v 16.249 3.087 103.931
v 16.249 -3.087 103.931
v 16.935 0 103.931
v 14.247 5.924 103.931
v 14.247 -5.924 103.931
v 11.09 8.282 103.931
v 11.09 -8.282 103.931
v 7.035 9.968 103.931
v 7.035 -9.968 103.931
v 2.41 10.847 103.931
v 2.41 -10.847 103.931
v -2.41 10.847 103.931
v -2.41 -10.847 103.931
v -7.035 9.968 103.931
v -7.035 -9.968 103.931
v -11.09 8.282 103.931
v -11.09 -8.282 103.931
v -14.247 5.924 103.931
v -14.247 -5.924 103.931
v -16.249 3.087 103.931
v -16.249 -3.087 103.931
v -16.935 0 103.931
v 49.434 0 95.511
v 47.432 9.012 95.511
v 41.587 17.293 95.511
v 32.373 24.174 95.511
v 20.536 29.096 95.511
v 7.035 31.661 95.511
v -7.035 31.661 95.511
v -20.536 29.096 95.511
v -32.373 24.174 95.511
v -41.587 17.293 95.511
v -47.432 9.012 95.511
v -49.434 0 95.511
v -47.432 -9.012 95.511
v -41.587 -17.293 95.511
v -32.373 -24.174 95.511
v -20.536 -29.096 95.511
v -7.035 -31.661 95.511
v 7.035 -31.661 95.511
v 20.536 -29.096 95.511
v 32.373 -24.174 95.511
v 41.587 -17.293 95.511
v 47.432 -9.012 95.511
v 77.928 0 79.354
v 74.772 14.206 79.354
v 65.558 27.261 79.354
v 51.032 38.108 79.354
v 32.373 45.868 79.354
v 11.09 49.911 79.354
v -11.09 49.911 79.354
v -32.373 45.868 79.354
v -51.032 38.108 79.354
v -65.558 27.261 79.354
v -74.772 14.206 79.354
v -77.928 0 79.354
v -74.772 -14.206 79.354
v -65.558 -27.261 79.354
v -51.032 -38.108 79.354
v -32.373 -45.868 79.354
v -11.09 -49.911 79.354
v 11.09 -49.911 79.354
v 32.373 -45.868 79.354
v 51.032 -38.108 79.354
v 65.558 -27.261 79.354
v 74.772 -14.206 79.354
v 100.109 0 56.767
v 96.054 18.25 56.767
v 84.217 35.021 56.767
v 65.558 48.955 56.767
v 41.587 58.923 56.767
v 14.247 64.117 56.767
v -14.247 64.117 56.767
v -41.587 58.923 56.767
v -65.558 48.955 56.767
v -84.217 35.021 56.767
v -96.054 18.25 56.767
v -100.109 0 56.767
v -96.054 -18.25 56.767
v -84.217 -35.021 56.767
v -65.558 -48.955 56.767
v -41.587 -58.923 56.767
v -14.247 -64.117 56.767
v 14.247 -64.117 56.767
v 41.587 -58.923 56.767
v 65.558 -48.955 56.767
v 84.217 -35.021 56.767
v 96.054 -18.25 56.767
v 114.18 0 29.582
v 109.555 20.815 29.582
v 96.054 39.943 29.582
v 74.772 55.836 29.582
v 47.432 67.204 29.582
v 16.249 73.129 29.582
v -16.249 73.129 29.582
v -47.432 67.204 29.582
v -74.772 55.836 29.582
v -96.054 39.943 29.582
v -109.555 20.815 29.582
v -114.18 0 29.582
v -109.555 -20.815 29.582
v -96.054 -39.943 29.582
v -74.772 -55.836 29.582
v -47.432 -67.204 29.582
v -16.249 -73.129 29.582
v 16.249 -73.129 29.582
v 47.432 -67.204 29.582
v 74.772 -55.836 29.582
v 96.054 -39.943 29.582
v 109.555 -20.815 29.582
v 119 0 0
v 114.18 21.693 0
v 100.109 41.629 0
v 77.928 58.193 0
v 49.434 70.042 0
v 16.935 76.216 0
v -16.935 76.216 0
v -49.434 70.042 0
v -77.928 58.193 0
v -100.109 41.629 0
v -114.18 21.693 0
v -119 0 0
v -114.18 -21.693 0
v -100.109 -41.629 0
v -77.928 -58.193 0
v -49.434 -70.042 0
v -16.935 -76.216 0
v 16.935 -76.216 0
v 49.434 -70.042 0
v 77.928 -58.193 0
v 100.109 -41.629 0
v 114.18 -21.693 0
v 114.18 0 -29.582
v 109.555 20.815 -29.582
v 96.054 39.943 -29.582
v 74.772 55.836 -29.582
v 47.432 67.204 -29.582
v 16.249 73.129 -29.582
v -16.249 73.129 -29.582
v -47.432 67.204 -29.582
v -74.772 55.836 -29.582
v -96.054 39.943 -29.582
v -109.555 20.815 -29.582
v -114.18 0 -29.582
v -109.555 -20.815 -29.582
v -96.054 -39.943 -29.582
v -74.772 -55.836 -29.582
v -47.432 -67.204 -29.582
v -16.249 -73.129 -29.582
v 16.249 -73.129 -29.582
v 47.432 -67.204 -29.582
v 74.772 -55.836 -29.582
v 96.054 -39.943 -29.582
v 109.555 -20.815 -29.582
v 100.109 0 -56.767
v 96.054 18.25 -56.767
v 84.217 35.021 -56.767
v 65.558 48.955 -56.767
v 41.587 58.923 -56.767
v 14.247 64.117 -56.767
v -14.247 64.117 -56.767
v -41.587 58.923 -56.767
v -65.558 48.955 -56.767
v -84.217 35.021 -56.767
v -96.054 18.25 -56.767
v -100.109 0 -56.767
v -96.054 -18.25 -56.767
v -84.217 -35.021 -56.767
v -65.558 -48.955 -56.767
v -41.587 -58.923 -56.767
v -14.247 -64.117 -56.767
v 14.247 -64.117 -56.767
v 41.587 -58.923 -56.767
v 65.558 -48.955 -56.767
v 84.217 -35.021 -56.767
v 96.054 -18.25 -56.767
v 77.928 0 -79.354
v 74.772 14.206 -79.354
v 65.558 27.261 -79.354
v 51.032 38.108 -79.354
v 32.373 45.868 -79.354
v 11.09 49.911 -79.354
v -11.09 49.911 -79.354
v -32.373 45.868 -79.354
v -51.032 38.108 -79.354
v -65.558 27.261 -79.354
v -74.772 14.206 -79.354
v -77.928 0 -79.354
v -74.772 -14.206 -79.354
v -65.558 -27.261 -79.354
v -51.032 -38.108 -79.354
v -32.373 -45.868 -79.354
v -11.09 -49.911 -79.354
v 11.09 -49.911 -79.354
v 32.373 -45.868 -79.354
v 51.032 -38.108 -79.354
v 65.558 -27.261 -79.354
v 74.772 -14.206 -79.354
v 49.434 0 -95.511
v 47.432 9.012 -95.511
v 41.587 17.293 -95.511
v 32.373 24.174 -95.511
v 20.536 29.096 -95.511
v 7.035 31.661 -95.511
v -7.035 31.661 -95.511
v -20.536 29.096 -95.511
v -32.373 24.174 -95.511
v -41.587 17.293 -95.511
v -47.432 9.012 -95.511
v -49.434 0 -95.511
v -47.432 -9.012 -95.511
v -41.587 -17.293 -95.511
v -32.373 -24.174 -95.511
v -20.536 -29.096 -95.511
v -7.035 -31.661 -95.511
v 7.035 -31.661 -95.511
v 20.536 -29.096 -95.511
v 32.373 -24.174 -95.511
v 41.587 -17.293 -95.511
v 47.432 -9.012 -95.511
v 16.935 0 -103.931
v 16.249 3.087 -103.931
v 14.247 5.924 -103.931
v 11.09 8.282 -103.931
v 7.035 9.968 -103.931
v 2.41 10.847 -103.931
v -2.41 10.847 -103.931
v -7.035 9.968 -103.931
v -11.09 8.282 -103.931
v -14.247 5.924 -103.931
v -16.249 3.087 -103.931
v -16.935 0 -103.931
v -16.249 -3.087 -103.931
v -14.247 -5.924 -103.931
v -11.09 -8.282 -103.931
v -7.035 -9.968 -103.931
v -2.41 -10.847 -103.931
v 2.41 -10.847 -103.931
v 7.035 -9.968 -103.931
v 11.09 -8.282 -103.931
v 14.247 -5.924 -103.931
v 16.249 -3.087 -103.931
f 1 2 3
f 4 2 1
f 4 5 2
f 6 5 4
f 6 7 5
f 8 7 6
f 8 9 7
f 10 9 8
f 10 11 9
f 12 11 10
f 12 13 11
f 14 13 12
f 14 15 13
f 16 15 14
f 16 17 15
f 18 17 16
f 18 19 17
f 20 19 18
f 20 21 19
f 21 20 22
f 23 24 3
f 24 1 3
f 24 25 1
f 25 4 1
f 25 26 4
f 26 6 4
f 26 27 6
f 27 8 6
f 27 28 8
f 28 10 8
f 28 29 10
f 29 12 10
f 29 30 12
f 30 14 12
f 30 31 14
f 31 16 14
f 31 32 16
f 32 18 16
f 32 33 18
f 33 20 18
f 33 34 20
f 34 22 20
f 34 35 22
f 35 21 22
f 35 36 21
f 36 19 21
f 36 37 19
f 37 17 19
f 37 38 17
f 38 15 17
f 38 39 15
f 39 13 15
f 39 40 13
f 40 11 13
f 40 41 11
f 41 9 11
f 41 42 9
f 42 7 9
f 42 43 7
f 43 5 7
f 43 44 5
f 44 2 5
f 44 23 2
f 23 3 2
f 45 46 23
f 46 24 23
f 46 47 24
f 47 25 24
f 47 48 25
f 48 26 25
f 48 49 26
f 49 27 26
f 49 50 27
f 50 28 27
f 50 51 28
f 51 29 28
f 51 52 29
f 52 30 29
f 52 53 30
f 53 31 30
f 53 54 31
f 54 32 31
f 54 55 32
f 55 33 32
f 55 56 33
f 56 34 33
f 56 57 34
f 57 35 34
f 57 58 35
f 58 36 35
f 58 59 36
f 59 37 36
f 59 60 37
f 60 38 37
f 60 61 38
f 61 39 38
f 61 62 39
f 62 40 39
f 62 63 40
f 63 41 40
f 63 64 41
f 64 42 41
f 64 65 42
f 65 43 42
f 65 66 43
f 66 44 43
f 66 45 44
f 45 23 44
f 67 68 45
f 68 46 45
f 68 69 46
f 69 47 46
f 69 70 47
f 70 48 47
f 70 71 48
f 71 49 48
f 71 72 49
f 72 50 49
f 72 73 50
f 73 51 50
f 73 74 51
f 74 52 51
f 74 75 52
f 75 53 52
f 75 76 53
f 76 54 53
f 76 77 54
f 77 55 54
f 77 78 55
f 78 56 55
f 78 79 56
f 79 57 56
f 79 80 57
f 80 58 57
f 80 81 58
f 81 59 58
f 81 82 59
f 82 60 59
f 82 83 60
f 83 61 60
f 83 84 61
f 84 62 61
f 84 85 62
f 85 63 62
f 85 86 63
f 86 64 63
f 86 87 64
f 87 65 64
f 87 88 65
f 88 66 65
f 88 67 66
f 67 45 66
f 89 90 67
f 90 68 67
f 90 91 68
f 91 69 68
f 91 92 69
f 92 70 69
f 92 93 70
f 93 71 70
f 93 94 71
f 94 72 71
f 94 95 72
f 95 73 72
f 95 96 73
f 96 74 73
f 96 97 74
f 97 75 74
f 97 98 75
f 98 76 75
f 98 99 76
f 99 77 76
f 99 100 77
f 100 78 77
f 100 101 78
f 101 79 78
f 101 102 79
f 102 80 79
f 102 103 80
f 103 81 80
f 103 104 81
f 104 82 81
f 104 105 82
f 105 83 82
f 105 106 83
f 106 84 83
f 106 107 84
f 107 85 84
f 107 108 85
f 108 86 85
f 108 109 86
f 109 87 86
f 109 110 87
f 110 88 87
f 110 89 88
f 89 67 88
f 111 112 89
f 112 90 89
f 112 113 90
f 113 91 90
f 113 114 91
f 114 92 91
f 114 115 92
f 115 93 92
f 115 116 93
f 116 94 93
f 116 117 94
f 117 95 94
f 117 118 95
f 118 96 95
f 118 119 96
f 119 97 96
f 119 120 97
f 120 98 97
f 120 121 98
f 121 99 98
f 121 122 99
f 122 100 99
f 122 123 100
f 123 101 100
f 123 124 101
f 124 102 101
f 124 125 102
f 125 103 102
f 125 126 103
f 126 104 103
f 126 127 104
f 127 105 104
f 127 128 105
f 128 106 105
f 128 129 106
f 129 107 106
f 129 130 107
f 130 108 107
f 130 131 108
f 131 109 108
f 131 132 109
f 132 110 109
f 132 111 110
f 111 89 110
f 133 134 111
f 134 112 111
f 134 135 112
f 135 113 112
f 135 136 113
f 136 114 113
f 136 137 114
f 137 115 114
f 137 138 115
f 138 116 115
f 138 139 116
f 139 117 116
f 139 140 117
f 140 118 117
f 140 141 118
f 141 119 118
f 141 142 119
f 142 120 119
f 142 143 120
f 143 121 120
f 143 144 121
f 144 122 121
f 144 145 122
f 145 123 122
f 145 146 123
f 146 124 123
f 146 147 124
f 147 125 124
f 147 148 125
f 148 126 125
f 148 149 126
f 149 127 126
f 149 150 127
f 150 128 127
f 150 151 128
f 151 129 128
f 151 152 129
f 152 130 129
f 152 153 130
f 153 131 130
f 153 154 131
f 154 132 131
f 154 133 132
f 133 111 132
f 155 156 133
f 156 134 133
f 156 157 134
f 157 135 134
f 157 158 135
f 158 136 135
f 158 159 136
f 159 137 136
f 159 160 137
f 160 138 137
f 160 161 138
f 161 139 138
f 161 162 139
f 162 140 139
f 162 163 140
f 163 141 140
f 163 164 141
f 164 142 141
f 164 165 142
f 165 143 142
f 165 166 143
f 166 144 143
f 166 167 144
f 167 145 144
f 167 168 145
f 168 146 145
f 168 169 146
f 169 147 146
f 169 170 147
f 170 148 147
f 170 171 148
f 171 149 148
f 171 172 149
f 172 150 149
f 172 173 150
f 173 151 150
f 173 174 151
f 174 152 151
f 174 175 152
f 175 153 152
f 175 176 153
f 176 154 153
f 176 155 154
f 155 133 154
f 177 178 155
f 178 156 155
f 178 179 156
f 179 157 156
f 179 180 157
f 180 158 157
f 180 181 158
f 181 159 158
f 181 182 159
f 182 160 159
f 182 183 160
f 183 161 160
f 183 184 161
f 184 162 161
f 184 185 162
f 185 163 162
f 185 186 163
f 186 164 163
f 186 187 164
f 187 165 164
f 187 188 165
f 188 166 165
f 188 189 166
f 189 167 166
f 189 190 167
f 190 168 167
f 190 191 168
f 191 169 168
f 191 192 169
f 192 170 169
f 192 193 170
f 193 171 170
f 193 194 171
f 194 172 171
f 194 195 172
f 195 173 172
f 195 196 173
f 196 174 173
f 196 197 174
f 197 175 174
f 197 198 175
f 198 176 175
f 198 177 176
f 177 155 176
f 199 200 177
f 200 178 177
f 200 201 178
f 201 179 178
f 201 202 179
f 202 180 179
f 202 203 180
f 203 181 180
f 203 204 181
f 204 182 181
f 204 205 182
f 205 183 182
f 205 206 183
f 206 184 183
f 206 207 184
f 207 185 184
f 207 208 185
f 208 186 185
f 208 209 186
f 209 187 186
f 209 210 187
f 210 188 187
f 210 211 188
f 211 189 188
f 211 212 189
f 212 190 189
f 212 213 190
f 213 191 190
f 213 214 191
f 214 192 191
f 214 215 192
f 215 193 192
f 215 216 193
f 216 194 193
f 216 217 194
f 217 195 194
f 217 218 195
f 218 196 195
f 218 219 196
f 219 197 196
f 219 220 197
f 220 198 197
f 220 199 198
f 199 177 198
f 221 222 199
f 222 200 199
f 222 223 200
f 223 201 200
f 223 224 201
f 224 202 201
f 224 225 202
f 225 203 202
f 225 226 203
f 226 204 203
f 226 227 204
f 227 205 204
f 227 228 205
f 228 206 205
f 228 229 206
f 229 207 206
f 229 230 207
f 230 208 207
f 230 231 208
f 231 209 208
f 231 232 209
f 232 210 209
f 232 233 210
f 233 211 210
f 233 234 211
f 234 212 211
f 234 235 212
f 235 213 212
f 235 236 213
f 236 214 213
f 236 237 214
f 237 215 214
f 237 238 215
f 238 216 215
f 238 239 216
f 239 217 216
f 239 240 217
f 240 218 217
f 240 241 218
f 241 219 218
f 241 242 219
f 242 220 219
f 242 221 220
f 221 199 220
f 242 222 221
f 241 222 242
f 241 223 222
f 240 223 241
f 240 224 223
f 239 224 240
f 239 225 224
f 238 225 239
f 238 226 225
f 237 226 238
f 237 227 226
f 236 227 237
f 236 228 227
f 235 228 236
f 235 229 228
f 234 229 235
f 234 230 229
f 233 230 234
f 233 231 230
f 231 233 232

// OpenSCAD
// Generated by SolidPython 1.0.1 on 2020-07-29 00:46:53


scale(v = [17, 11, 15]) {
	sphere(r = 7);
}
/***********************************************
*********      SolidPython code:      **********
************************************************
 
# import packages: SolidPython
from solid import *
from solid.utils import *
from itertools import chain, combinations, permutations


class Resize:

    def __init__(self, scad_file):
        self.scad_file = scad_file
        #self.scad_file = import_scad(scad_file)
        # cone/cylinder param:
        self.r1 = 0
        self.r2 = 0
        self.h = 0
        # rectangular prism param:
        self.w = 0
        self.l = 0
        # ellipse param:
        self.r = 0

    # import OpenScad code (file name corresponds to shape)


    # classify shape + parameters
    def assign(self, param1, param2, param3):
        if self.scad_file == 'cone.scad':
            self.r1 = param1
            self.r2 = param2
            self.h = param3
        elif self.scad_file == 'cylinder.scad':
            self.r1 = param1
            self.r2 = param2
            self.h = param3
        elif self.scad_file == 'rectangularPrism.scad':
            self.h = param1
            self.l = param2
            self.w = param3
        else:
            self.r = param1
            self.h = param2

    # resize parameters
    def iterate(self):
        x = range(3, 20, 2)
        i = 1
        if self.scad_file == 'cone.scad':
            tempList = list(permutations(x, 2))
            for temp in tempList:
                param1 = temp[0]
                param2 = temp[1]
                filepath = 'produced_scad_files/' + 'cone' + str(param1) + '_' + str(param2) + '_' + '.scad'
                scad_render_to_file(cylinder(h=param1, r1=param2, r2=0), filepath)

        elif self.scad_file == 'cylinder.scad':
            tempList = list(permutations(x, 3))
            for temp in tempList:
                param1 = temp[0]
                param2 = temp[1]
                filepath = 'produced_scad_files/' + 'cylinder' + str(param1) + '_' + str(param2) + '_' + '.scad'
                scad_render_to_file(cylinder(h=param1, r1=param2, r2=param2), filepath)

        elif self.scad_file == 'rectangularPrism.scad':
            tempList = list(permutations(x, 3))
            for temp in tempList:
                param1 = temp[0]
                param2 = temp[1]
                param3 = temp[2]
                filepath = 'produced_scad_files/' + 'rectangularPrism' + str(param1) + '_' + str(param2) + '_' + str(
                    param3) + '.scad'
                scad_render_to_file(cube(size=(param1, param2, param3)), filepath)

        elif self.scad_file == 'ellipse.scad':
            tempList = list(permutations(x, 4))
            for temp in tempList:
                param1 = temp[0]
                param2 = temp[1]
                param3 = temp[2]
                param4 = temp[3]
                filepath = 'produced_scad_files/' + 'ellipse' + str(param1) + '_' + str(param2) + '_' + str(param3) + '_' + str(param4) + '.scad'
                scad_render_to_file(scale([param1, param2, param3])(sphere(r=param4)), filepath)

    def render_to_scadfile(self):
        scad_render_to_file(scad, 'example.scad') 
 
************************************************/
